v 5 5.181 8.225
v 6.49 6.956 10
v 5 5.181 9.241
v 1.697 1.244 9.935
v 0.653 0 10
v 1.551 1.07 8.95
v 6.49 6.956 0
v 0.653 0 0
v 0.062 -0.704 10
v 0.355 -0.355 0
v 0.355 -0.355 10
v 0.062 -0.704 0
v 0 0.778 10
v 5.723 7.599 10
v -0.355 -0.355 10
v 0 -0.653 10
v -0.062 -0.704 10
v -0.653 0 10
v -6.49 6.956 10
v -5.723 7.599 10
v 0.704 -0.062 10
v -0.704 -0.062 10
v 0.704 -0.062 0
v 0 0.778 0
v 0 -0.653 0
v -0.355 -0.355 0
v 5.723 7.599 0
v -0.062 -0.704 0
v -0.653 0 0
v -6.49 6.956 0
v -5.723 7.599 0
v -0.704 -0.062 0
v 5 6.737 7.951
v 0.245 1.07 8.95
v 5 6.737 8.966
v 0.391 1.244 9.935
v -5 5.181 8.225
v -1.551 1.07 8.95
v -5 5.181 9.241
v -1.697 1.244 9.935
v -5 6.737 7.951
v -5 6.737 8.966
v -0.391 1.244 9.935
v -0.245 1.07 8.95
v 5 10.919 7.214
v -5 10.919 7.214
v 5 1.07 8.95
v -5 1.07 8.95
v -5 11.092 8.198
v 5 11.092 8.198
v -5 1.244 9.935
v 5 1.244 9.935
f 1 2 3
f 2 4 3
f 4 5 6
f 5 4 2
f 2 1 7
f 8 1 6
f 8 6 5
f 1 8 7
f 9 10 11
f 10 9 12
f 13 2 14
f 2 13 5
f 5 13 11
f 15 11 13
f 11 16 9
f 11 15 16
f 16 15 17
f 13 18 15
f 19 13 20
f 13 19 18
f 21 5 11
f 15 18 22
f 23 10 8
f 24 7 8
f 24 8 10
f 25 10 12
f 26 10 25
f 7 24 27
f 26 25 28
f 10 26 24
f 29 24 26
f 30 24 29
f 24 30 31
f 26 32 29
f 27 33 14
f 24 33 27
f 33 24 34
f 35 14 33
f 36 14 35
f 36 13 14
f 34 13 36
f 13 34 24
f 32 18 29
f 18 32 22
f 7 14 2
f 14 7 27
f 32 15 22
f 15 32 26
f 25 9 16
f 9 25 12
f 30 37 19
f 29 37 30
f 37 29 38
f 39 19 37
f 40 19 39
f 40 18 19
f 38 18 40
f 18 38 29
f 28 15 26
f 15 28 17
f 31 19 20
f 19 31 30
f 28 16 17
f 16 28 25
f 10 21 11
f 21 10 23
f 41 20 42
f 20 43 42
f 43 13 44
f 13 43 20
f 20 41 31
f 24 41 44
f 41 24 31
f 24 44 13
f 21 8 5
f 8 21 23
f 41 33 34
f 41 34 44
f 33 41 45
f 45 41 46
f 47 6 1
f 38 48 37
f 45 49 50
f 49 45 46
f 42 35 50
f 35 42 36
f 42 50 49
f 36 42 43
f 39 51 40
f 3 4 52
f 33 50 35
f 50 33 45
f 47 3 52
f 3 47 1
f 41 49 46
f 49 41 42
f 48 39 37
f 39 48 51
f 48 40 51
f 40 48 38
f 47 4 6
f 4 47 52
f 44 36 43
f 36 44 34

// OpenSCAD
rotate([0,0,-40]) translate([0,4.5,5]) cube([1,10,10], center=true);
rotate([0,0,40]) translate([0,4.5,5]) cube([1,10,10], center=true);
rotate([-10,0,0]) translate([0,4.5,9.5]) cube([10,10,1], center=true);
translate([0,7,4]) % sphere(r=4, $fn=64);
translate([0,7,4]) rotate([-130,0,0]) % cylinder(r=2, h=10, $fn=32);
